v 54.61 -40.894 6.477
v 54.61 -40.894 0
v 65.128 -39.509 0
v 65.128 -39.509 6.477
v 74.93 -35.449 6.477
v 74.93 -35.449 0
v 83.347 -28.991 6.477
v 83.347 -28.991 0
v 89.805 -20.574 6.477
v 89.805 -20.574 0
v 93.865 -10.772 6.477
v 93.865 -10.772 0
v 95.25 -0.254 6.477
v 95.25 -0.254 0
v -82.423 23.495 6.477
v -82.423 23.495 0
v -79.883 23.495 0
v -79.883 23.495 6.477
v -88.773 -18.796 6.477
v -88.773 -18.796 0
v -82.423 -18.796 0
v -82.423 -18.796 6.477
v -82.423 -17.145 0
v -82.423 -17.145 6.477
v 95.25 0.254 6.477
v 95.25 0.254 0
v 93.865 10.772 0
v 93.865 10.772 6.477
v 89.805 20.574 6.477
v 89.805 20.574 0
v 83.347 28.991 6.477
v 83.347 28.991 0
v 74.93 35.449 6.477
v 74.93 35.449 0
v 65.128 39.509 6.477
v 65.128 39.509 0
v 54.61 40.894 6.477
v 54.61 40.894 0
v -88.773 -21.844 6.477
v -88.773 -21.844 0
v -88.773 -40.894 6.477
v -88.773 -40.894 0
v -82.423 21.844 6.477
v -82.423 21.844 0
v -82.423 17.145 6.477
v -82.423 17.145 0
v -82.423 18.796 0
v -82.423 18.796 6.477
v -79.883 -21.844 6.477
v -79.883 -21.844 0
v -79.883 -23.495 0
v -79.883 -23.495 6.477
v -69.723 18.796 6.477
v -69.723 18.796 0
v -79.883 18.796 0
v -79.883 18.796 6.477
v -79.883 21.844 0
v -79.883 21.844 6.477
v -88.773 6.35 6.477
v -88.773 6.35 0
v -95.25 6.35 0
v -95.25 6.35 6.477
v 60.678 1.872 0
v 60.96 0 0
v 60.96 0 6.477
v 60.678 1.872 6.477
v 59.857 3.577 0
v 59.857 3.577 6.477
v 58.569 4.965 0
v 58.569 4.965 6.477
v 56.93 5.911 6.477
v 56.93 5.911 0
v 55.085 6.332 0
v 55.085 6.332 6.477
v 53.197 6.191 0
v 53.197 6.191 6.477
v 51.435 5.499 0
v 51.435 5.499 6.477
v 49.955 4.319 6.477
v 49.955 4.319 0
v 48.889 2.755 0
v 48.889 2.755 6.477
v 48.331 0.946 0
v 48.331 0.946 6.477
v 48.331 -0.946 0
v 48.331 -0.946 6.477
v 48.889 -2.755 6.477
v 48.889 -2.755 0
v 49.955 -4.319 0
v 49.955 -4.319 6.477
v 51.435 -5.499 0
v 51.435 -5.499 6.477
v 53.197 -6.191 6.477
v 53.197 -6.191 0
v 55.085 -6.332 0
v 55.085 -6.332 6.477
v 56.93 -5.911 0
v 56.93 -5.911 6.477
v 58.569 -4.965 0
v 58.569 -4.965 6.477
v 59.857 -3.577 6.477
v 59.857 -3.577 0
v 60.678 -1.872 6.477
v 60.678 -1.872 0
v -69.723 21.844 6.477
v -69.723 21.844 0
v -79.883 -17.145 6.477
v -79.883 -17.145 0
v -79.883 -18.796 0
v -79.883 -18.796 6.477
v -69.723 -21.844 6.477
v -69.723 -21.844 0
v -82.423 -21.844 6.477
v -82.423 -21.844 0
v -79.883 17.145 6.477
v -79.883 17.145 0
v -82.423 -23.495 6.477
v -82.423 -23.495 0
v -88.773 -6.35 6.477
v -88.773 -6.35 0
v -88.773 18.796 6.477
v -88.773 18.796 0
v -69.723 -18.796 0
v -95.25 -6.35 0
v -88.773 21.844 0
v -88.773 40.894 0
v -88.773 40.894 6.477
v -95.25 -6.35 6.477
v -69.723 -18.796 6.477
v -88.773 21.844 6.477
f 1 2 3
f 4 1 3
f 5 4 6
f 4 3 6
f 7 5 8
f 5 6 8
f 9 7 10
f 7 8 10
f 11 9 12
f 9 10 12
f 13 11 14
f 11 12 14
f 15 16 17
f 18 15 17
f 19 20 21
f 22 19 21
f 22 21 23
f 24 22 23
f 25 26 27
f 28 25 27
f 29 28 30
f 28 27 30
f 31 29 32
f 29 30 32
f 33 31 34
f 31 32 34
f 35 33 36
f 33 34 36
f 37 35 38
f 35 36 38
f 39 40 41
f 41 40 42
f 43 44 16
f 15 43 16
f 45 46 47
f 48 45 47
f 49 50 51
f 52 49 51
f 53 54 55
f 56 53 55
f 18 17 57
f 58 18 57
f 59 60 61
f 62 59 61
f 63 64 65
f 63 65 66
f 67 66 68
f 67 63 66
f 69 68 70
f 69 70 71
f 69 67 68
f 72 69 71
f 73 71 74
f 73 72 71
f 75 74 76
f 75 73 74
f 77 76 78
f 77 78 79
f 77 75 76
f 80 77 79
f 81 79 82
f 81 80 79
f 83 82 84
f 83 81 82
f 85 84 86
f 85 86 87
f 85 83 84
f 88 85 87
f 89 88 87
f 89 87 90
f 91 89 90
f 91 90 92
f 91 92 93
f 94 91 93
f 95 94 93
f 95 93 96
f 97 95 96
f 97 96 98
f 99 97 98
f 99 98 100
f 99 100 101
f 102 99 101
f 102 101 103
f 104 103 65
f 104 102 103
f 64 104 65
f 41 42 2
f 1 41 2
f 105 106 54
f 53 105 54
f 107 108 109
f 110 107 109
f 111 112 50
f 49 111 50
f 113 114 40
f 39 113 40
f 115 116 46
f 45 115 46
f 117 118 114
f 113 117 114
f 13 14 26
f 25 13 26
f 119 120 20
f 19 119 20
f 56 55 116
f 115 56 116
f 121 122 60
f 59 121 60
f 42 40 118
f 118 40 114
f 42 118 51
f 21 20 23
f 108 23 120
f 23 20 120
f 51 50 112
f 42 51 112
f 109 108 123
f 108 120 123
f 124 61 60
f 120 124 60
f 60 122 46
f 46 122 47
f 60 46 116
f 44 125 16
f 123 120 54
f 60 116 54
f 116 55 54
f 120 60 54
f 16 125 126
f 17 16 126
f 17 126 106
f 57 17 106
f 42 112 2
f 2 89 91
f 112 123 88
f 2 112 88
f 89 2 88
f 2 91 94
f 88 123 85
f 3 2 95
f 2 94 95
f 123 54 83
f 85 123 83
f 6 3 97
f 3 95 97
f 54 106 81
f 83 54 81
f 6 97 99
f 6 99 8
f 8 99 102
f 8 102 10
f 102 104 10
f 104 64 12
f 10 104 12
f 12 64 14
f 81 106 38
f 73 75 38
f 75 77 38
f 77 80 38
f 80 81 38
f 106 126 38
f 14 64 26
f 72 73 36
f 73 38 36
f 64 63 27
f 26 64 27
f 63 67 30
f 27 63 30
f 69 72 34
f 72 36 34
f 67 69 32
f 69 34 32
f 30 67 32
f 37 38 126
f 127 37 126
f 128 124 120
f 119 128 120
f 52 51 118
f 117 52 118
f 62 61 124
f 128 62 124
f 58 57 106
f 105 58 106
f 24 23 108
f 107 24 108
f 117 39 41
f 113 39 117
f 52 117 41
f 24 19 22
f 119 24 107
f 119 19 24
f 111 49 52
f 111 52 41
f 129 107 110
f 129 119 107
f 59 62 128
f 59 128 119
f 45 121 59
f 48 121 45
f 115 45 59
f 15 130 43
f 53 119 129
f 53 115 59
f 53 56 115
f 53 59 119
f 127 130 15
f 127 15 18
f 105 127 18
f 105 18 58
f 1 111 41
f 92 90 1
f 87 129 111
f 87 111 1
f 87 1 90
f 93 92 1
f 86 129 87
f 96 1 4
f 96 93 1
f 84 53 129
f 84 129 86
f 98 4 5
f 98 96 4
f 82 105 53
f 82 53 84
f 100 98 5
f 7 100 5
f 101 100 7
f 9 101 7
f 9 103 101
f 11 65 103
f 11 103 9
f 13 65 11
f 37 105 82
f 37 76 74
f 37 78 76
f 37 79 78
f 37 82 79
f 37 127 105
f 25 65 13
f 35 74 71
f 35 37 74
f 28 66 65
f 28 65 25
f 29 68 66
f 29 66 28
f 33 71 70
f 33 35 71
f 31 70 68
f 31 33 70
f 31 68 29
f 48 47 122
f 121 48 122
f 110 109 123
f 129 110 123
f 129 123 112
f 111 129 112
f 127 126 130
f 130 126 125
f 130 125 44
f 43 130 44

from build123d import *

# Parameters (mm, degrees)
SKETCH1_R           = 6.35
BOSS_EXTRUDE1_DEPTH = 6.477


with BuildPart() as part:
    # Sketch1 → Boss-Extrude1 (new body)
    with BuildSketch(Plane.XY):
        with BuildLine():
            Line((-88.773, 18.796), (-88.773, 6.35))
            Line((-88.773, 6.35), (-95.25, 6.35))
            Line((-95.25, 6.35), (-95.25, -6.35))
            Line((-95.25, -6.35), (-88.773, -6.35))
            Line((-88.773, -6.35), (-88.773, -18.796))
            Line((-88.773, -18.796), (-82.423, -18.796))
            Line((-82.423, -18.796), (-82.423, -17.145))
            Line((-82.423, -17.145), (-79.883, -17.145))
            Line((-79.883, -17.145), (-79.883, -18.796))
            Line((-79.883, -18.796), (-69.723, -18.796))
            Line((-69.723, -18.796), (-69.723, -21.844))
            Line((-69.723, -21.844), (-79.883, -21.844))
            Line((-79.883, -21.844), (-79.883, -23.495))
            Line((-79.883, -23.495), (-82.423, -23.495))
            Line((-82.423, -23.495), (-82.423, -21.844))
            Line((-82.423, -21.844), (-88.773, -21.844))
            Line((-88.773, -21.844), (-88.773, -40.894))
            Line((-88.773, -40.894), (54.61, -40.894))
            ThreePointArc((54.61, -40.894), (83.346819587, -28.990819587), (95.25, -0.254))
            Line((95.25, -0.254), (95.25, 0.254))
            ThreePointArc((95.25, 0.254), (83.346819587, 28.990819587), (54.61, 40.894))
            Line((54.61, 40.894), (-88.773, 40.894))
            Line((-88.773, 40.894), (-88.773, 21.844))
            Line((-88.773, 21.844), (-82.423, 21.844))
            Line((-82.423, 21.844), (-82.423, 23.495))
            Line((-82.423, 23.495), (-79.883, 23.495))
            Line((-79.883, 23.495), (-79.883, 21.844))
            Line((-79.883, 21.844), (-69.723, 21.844))
            Line((-69.723, 21.844), (-69.723, 18.796))
            Line((-69.723, 18.796), (-79.883, 18.796))
            Line((-79.883, 18.796), (-79.883, 17.145))
            Line((-79.883, 17.145), (-82.423, 17.145))
            Line((-82.423, 17.145), (-82.423, 18.796))
            Line((-82.423, 18.796), (-88.773, 18.796))
        make_face()
        with Locations((54.61, 0)):
            Circle(SKETCH1_R, mode=Mode.SUBTRACT)
    extrude(amount=BOSS_EXTRUDE1_DEPTH)


solid = part.part
